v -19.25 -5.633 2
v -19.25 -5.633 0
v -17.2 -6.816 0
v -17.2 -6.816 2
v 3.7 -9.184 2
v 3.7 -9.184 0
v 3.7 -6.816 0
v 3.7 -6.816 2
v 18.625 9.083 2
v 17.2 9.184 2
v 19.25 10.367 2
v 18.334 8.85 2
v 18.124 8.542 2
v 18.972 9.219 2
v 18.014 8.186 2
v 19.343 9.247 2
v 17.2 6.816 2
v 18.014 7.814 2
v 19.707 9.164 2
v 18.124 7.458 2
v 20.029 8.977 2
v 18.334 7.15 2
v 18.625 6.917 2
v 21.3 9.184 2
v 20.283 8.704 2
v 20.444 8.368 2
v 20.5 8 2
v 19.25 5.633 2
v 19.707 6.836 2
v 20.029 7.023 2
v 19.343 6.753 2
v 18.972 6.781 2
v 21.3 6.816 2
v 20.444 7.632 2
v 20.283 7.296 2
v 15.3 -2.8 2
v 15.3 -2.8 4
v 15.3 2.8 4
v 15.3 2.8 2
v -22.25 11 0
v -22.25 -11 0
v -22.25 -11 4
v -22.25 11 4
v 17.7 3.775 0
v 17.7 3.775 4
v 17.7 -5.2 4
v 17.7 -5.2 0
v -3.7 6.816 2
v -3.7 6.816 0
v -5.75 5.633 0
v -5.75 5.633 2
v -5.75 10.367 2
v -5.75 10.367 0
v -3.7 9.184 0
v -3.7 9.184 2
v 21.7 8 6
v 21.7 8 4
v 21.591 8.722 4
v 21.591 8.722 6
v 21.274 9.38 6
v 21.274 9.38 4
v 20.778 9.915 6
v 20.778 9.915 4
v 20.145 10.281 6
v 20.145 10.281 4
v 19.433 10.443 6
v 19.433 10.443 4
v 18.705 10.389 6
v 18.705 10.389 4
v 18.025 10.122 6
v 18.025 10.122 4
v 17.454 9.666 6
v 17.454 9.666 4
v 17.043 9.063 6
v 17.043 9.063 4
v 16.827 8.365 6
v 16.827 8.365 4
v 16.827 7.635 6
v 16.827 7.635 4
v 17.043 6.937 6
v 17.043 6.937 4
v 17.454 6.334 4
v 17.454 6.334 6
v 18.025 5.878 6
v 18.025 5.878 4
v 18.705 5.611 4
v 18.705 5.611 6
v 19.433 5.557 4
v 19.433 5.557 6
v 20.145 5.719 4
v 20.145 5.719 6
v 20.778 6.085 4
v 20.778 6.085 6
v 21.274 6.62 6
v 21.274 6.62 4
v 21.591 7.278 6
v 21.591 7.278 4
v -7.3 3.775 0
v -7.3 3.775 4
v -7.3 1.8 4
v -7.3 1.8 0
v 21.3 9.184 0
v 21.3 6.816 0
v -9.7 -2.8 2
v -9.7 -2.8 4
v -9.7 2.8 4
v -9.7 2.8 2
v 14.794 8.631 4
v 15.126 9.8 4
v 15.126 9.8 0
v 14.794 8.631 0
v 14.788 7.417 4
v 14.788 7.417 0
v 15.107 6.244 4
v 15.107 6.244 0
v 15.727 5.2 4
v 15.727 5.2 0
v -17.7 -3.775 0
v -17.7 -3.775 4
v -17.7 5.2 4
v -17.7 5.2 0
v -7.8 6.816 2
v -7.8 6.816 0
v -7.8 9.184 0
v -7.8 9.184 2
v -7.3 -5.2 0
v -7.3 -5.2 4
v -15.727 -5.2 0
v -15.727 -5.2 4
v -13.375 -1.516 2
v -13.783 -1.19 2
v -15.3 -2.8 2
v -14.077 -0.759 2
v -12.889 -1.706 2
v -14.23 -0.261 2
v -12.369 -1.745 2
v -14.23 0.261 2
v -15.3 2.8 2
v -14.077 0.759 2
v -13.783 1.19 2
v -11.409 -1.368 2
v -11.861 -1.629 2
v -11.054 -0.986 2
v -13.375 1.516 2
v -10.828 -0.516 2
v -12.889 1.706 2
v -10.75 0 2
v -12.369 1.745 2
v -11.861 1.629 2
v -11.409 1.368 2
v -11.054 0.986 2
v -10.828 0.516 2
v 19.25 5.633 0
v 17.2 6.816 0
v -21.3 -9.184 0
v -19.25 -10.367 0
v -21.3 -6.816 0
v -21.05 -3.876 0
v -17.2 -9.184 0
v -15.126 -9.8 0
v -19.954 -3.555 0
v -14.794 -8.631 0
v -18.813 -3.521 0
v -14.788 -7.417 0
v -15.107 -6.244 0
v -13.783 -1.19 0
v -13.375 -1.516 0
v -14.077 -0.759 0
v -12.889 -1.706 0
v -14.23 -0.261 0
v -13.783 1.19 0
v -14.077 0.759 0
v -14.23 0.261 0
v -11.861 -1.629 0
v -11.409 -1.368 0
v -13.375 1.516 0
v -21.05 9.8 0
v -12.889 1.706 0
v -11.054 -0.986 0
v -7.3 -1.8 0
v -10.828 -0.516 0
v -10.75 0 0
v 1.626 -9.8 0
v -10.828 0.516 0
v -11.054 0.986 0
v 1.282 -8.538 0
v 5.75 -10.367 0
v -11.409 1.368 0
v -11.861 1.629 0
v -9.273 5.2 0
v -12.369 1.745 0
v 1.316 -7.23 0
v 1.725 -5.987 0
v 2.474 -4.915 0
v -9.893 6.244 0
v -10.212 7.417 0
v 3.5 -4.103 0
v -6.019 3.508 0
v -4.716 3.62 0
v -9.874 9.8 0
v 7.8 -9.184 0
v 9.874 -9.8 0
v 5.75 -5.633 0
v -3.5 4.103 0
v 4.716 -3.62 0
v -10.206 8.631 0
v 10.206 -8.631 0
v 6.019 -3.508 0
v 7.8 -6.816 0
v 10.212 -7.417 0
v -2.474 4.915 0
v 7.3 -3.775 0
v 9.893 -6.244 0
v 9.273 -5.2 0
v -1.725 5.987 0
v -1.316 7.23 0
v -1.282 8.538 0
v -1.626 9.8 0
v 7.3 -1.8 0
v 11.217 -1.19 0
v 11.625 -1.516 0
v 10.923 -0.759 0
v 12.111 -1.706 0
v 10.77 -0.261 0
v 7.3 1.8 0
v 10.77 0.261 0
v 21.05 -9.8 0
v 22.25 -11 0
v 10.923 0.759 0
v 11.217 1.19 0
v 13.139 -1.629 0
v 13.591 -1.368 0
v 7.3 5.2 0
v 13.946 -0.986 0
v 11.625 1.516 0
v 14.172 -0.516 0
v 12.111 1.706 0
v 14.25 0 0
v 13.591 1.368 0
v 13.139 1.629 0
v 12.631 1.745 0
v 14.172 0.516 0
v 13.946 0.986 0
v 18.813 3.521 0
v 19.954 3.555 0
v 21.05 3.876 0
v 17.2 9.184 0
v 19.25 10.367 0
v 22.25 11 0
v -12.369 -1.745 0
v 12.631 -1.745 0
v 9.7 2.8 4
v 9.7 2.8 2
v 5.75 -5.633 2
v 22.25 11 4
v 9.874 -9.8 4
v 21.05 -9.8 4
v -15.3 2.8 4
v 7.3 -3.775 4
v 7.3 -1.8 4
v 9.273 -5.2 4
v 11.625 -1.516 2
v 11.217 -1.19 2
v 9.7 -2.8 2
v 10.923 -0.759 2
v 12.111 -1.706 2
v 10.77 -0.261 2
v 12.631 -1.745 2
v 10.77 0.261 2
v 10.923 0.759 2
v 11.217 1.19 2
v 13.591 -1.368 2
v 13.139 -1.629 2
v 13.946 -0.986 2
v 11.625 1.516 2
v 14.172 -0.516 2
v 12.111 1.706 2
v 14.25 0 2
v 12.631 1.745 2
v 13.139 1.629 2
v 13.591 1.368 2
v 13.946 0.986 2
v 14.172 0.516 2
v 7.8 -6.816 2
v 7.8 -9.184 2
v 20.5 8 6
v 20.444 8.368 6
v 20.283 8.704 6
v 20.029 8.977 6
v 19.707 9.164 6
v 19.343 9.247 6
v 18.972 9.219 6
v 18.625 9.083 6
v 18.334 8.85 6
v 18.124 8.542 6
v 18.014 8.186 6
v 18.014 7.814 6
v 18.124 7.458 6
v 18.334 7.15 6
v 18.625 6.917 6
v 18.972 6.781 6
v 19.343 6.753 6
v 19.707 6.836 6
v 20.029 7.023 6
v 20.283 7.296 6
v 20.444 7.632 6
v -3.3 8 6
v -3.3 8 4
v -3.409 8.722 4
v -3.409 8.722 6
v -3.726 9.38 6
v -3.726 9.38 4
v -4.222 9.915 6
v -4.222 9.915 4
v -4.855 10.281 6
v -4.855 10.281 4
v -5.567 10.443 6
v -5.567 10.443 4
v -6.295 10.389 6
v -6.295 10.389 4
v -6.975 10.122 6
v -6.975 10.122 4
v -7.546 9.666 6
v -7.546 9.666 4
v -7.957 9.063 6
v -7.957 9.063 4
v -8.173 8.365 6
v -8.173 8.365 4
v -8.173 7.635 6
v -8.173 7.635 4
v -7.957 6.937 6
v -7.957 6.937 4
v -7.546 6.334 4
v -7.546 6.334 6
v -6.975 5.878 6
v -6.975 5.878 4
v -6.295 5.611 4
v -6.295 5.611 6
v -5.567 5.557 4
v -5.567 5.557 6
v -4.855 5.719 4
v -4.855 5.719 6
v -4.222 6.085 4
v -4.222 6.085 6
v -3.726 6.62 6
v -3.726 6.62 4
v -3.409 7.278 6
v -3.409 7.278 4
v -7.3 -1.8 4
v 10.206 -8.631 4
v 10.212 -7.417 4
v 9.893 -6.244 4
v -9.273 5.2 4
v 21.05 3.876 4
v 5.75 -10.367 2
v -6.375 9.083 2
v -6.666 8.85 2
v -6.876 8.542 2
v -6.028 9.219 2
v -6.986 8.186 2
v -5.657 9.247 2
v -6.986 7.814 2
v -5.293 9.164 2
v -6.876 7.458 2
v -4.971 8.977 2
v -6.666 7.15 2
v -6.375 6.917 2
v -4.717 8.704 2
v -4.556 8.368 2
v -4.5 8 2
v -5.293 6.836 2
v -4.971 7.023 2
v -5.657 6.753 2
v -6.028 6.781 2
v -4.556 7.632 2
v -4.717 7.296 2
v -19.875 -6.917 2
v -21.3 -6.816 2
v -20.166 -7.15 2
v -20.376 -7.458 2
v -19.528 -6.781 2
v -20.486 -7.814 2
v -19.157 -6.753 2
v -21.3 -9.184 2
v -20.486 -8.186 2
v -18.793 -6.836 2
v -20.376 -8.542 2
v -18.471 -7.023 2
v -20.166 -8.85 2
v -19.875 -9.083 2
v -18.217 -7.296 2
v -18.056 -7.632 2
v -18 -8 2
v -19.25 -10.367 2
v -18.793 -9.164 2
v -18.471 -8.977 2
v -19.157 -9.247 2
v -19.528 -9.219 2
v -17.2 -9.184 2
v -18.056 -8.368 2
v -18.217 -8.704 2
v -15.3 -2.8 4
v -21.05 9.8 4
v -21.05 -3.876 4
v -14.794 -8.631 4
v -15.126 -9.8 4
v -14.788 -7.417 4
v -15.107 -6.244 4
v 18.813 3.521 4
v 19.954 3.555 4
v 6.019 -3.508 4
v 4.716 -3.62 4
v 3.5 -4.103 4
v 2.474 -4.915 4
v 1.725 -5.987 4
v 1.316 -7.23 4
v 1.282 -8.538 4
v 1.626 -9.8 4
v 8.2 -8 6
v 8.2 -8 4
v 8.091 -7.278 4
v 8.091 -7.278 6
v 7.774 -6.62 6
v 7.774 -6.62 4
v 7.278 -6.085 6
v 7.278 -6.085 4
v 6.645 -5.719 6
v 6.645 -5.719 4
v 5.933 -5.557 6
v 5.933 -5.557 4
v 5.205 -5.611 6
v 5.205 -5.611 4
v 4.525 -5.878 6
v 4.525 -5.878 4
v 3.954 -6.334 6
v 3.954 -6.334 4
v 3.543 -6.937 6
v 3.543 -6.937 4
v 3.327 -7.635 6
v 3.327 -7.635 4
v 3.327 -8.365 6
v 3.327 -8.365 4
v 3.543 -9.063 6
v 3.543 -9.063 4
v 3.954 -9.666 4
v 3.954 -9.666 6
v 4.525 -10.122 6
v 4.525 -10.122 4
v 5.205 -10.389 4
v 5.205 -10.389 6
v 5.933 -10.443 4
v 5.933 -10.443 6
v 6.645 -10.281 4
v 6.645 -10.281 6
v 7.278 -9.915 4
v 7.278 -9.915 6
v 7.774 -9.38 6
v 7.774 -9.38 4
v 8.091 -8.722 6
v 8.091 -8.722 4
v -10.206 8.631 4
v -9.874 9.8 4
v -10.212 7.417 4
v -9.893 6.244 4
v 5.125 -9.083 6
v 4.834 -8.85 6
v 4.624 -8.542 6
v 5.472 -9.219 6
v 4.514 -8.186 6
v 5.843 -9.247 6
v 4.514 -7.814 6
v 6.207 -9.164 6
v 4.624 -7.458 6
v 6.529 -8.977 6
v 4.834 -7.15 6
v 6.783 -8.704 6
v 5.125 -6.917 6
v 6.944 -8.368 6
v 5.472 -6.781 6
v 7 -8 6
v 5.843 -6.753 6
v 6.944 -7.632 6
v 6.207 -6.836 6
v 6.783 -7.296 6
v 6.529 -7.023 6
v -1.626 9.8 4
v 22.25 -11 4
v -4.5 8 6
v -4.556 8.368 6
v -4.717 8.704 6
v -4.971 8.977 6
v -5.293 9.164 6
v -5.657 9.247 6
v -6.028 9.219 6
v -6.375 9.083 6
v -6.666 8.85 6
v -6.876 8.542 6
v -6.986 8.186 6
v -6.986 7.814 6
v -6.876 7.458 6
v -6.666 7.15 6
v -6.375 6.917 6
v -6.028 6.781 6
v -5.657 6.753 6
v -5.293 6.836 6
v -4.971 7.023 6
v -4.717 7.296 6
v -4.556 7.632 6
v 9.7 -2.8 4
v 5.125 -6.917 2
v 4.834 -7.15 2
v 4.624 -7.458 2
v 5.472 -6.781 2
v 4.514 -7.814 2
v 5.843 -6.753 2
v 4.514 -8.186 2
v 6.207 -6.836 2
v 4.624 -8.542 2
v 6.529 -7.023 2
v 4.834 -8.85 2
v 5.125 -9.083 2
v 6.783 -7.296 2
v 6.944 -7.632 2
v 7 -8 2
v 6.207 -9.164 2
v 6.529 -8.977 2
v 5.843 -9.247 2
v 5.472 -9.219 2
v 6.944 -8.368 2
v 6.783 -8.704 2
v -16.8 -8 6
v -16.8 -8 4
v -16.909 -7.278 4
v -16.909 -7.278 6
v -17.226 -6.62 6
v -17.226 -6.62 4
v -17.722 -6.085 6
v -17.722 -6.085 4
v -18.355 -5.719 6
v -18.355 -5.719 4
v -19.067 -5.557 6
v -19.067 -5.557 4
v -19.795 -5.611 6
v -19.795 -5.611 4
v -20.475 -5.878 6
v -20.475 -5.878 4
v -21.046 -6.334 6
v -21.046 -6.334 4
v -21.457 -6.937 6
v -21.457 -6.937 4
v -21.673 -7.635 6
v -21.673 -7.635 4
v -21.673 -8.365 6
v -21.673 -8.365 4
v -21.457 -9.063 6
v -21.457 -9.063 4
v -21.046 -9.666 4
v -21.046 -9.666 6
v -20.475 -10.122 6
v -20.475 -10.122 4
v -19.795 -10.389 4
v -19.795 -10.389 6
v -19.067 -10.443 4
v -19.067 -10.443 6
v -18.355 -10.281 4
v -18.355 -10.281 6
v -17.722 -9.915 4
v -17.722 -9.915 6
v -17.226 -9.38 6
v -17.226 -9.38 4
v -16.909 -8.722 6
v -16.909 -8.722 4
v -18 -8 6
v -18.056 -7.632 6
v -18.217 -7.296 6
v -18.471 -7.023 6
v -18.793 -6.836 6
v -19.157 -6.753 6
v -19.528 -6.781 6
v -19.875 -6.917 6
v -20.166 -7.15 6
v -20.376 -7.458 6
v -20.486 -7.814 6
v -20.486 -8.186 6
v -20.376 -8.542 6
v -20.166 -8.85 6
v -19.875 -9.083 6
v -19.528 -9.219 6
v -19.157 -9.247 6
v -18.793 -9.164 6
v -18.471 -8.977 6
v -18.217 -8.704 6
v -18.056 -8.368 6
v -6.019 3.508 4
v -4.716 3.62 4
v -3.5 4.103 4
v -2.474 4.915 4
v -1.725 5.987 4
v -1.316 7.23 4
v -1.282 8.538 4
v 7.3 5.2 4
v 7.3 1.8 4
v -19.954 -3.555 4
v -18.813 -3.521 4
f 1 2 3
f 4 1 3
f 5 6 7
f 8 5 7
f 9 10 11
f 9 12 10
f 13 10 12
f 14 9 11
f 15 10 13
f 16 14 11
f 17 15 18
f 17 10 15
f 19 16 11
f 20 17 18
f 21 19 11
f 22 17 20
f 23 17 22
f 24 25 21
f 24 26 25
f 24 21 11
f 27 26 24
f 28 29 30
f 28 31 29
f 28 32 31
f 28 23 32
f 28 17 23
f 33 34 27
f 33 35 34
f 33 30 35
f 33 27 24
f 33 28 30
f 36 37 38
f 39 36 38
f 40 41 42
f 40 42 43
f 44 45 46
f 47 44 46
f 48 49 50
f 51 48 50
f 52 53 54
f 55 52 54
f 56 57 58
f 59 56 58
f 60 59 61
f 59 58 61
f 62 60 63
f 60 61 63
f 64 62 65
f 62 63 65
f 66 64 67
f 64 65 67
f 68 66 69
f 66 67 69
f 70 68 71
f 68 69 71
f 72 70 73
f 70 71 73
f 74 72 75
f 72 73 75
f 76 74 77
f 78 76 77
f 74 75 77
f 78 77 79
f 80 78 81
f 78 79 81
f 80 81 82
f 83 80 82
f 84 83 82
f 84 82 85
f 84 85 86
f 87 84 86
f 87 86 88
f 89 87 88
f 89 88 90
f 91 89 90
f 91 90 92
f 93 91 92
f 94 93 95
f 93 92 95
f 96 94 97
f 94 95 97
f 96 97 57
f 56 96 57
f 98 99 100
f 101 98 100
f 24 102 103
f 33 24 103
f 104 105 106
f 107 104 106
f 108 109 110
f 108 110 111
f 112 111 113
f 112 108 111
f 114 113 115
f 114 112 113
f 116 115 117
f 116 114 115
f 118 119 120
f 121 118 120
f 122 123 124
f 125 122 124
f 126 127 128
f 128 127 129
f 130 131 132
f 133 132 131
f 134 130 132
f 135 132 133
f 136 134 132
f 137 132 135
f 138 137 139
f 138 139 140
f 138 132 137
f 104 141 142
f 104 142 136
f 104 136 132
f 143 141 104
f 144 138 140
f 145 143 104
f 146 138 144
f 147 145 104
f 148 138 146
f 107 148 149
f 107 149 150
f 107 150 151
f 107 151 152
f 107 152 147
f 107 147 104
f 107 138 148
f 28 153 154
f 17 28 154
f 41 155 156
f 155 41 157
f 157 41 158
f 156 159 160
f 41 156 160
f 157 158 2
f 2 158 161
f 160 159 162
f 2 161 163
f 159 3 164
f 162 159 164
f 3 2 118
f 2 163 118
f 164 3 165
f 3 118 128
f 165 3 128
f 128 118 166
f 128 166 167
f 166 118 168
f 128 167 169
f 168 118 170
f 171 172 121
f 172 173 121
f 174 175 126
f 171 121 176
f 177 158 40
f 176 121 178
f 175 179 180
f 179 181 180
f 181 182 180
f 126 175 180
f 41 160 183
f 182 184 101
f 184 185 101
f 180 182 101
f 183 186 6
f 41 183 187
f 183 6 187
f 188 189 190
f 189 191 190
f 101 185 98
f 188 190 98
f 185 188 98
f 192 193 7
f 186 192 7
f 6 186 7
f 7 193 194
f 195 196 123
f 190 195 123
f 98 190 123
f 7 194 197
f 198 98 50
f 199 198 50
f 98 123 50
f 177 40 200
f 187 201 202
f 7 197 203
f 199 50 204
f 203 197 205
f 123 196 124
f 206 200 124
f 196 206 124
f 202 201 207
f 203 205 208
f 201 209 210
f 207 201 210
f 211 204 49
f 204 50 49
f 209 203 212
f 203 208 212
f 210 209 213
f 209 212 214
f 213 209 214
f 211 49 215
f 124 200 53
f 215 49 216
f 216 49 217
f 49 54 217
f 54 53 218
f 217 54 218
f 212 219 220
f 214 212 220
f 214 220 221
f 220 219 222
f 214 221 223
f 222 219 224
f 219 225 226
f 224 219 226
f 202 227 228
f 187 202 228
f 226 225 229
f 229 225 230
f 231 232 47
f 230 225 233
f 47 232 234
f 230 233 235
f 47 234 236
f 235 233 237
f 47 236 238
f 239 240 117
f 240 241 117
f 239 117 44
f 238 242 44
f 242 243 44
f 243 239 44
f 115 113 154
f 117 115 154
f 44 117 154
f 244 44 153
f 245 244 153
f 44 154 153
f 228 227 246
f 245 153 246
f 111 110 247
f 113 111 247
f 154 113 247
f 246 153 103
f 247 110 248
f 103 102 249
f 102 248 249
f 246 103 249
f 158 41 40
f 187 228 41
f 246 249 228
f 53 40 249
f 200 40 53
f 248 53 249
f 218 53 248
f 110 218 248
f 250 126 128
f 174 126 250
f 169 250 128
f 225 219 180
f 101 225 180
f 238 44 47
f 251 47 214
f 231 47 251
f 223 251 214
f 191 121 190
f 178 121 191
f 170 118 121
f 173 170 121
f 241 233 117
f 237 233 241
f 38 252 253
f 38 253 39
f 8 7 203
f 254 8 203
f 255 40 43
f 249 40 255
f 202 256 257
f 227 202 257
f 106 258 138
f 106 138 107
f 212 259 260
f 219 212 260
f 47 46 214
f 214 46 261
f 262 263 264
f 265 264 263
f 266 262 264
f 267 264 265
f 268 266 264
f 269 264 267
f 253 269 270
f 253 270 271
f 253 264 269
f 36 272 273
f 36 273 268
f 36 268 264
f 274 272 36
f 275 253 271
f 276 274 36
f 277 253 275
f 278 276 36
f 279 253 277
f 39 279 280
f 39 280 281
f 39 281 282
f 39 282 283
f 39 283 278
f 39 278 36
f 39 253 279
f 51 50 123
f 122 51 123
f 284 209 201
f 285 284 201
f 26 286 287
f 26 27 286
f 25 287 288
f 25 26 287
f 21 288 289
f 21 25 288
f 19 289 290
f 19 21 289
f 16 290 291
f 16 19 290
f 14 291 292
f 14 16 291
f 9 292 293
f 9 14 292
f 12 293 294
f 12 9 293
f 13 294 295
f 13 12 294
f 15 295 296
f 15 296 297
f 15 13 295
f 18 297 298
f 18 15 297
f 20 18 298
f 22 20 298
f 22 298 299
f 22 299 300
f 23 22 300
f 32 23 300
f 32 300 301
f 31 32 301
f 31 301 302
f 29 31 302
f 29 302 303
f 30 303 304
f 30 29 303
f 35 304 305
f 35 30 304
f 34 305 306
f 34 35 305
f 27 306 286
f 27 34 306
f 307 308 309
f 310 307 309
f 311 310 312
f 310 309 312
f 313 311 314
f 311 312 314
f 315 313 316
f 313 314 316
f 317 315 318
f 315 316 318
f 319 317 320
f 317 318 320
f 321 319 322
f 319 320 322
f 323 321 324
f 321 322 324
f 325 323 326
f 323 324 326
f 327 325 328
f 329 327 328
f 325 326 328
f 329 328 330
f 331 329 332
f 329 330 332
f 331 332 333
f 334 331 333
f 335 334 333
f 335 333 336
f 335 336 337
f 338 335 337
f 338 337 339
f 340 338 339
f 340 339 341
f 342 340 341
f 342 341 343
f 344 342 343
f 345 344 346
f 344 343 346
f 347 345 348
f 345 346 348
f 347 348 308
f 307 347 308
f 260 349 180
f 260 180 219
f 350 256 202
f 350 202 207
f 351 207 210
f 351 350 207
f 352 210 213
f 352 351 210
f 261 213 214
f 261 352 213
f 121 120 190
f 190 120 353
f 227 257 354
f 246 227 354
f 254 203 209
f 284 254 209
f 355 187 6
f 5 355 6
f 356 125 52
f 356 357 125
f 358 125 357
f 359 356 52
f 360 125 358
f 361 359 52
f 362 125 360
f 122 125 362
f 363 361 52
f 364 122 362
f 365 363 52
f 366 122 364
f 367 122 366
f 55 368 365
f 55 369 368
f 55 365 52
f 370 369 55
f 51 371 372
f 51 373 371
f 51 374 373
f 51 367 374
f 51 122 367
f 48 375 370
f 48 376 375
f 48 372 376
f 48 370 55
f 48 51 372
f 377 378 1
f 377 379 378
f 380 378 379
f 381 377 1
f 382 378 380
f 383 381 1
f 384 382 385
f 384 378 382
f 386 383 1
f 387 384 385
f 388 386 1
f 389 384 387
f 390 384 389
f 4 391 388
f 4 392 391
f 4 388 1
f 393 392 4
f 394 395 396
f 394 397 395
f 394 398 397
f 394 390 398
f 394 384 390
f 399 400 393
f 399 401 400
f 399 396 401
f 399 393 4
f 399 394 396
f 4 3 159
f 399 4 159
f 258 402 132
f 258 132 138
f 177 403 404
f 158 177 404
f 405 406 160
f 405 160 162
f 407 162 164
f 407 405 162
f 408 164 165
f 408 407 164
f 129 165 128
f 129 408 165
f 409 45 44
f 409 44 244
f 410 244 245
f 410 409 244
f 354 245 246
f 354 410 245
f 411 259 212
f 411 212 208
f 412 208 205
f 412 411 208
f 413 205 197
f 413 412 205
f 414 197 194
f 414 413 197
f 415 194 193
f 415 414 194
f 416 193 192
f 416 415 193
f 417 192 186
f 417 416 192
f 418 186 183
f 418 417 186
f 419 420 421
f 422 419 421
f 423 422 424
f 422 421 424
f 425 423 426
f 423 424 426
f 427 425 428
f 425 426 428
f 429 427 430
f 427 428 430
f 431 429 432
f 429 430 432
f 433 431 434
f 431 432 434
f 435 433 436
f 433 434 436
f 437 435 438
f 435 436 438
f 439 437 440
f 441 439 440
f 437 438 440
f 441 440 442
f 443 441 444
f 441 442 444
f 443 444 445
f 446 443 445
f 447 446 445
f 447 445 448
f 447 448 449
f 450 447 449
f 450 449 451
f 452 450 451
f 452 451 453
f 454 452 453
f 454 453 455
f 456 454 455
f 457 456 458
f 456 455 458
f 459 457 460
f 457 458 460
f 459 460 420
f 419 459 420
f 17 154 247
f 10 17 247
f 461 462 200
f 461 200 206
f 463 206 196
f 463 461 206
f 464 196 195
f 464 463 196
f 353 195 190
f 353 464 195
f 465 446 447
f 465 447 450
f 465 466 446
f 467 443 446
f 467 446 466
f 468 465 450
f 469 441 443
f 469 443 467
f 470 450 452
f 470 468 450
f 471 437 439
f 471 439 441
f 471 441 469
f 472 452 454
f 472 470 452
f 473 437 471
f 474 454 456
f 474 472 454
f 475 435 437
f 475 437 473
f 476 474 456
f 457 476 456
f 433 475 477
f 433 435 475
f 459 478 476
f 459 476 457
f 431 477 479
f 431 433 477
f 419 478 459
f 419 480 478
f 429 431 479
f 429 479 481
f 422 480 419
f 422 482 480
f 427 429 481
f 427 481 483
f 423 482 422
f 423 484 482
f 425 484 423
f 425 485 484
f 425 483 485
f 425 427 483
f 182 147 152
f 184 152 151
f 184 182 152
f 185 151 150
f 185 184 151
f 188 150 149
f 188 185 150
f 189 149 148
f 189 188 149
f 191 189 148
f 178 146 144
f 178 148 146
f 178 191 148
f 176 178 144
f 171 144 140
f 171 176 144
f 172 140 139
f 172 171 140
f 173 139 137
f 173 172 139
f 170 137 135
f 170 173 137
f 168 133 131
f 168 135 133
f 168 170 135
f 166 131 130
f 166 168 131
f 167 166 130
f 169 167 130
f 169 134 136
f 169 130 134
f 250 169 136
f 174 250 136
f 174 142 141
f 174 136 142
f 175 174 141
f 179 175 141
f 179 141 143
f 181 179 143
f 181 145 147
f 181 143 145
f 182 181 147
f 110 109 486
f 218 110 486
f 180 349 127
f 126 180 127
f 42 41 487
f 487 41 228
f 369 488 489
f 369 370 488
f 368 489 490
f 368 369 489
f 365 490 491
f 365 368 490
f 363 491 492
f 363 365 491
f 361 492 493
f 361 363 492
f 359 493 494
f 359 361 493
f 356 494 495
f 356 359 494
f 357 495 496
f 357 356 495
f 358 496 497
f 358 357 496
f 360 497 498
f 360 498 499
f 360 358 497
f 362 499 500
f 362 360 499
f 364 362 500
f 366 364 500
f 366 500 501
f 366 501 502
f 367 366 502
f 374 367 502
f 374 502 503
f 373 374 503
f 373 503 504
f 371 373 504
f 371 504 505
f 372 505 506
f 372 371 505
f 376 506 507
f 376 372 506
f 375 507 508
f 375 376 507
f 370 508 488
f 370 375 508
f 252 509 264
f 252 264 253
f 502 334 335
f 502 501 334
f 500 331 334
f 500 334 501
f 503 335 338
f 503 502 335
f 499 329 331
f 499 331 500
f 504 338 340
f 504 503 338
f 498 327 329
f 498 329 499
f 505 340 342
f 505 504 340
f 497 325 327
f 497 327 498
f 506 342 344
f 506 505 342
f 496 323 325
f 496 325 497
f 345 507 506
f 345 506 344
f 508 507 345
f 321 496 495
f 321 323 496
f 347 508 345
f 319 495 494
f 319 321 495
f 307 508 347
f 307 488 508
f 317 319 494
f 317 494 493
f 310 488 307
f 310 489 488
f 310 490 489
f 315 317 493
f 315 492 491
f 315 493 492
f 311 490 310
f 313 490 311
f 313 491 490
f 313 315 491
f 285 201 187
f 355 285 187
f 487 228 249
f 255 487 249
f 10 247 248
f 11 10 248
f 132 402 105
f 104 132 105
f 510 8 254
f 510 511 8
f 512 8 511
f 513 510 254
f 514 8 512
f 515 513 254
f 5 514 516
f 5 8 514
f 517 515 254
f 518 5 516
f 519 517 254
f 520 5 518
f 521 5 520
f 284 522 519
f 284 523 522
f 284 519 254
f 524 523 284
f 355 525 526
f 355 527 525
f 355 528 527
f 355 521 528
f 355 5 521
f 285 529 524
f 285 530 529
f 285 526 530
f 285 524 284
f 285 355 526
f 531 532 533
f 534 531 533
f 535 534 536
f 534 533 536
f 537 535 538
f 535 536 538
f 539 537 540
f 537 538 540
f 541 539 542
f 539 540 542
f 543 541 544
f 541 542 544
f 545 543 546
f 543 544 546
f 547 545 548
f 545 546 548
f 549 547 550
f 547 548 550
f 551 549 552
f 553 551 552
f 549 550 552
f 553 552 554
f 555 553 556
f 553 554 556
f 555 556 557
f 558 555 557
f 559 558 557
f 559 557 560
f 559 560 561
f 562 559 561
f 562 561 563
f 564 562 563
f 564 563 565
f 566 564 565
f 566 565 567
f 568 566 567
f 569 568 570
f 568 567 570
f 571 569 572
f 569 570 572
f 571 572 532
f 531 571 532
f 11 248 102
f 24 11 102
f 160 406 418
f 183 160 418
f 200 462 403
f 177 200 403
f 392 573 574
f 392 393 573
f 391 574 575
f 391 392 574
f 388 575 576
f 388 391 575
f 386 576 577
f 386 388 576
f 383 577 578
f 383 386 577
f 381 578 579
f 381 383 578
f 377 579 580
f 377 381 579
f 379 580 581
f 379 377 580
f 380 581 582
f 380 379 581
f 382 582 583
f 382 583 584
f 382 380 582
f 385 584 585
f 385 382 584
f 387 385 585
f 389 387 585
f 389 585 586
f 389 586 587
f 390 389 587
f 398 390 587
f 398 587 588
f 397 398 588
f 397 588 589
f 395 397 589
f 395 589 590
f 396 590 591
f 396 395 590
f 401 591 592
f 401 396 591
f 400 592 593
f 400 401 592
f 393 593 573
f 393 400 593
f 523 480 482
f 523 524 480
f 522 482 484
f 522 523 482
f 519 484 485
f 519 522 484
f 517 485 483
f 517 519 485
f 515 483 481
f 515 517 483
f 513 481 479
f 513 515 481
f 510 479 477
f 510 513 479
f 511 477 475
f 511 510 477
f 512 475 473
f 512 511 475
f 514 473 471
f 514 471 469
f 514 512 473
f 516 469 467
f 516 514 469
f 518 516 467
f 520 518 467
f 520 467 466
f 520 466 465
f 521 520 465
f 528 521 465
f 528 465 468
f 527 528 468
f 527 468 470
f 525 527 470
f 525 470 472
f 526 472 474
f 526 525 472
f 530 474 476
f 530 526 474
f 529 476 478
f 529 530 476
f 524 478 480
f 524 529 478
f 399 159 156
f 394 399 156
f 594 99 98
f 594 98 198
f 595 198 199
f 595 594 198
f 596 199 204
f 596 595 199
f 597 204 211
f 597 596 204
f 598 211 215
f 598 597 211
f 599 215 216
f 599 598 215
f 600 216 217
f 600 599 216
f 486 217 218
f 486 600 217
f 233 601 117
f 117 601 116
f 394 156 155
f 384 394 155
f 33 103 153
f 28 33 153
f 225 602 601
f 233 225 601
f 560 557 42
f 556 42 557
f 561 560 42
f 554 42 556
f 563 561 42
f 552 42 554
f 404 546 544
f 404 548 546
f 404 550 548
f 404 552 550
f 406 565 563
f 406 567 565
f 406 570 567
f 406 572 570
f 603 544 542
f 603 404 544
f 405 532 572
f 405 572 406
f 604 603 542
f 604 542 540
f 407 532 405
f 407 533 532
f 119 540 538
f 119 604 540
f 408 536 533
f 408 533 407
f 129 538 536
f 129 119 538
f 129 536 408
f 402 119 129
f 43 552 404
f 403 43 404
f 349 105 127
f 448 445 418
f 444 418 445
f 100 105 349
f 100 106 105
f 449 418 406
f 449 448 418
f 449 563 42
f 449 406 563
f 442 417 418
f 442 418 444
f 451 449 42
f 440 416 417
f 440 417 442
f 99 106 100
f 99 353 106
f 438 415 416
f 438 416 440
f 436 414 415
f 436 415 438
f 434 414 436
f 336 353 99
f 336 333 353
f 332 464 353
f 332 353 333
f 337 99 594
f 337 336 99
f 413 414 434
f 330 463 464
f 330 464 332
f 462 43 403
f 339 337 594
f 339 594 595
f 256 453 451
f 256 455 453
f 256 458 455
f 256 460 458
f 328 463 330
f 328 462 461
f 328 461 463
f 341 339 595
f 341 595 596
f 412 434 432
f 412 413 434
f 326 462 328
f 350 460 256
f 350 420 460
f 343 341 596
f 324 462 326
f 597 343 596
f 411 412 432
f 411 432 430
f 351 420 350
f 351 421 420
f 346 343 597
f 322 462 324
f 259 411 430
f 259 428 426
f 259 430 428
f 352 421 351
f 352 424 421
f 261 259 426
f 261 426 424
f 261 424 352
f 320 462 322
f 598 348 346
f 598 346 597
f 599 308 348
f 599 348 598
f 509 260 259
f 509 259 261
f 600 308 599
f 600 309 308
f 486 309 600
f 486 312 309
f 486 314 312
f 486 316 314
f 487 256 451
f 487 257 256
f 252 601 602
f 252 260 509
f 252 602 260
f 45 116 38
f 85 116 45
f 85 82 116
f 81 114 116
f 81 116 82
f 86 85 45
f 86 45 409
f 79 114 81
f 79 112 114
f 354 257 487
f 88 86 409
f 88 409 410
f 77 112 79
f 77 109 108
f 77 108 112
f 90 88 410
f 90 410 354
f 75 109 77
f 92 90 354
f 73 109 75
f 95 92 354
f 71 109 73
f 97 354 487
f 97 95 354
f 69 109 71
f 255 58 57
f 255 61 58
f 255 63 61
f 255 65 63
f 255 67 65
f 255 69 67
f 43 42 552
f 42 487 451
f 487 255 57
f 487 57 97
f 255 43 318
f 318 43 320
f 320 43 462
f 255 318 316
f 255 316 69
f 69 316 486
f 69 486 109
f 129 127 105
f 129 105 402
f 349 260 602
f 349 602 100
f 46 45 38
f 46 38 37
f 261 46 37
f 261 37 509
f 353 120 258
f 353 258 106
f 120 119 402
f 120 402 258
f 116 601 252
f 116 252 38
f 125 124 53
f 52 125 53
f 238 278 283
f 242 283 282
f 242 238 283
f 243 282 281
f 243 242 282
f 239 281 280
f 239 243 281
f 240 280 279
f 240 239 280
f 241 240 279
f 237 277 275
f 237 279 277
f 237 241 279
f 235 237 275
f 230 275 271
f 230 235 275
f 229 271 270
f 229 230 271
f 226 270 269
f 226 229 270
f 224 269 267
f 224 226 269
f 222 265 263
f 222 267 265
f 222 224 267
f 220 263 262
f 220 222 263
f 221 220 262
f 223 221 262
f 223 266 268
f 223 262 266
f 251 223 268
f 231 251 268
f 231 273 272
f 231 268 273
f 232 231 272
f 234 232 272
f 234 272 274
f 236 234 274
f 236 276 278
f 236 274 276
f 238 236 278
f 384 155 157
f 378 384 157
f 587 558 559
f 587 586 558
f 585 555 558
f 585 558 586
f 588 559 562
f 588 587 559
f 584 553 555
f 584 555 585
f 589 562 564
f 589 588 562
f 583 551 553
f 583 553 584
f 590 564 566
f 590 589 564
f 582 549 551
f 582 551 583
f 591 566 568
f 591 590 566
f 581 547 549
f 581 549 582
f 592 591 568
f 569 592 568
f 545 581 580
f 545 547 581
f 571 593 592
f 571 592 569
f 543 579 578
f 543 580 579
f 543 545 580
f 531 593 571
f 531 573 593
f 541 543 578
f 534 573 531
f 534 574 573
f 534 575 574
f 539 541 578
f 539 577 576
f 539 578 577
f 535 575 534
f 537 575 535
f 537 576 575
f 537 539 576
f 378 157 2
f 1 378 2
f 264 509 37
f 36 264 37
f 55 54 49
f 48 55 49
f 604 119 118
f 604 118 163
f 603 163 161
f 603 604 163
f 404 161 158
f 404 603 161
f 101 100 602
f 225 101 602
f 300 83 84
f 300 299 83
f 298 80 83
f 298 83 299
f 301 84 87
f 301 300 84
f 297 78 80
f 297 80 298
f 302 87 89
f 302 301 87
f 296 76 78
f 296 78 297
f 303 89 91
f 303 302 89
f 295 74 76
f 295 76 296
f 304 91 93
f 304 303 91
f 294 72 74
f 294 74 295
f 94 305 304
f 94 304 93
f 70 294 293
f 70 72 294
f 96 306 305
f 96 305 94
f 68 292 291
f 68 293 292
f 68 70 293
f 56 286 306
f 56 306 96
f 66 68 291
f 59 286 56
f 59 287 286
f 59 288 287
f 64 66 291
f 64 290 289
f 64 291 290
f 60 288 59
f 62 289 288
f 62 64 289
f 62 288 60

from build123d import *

# Parameters (mm, degrees)
SKETCH_W        = 44.5
SKETCH_H        = 22
SKETCH_R        = 1.75
SKETCH_R_2      = 1.25
PAD_DEPTH       = 4
SKETCH001_W     = 5.6
SKETCH001_H     = 5.6
POCKET_DEPTH    = 2
POCKET001_DEPTH = 2
SKETCH003_R     = 2.45
SKETCH003_R_2   = 1.25
PAD001_DEPTH    = 2
POCKET002_DEPTH = 4.001


with BuildPart() as part:
    # Sketch → Pad (new body)
    with BuildSketch(Plane.XY):
        Rectangle(SKETCH_W, SKETCH_H)
        with Locations((-12.5, 0)):
            Circle(SKETCH_R, mode=Mode.SUBTRACT)
        with Locations((12.5, 0)):
            Circle(SKETCH_R, mode=Mode.SUBTRACT)
        with Locations((-19.25, -8)):
            Circle(SKETCH_R_2, mode=Mode.SUBTRACT)
        with Locations((-5.75, 8)):
            Circle(SKETCH_R_2, mode=Mode.SUBTRACT)
        with Locations((19.25, 8)):
            Circle(SKETCH_R_2, mode=Mode.SUBTRACT)
        with Locations((5.75, -8)):
            Circle(SKETCH_R_2, mode=Mode.SUBTRACT)
    extrude(amount=PAD_DEPTH)

    # Sketch001 (on Face12 of Pad) → Pocket (cut)
    with BuildSketch(Plane.XY.offset(4)):
        with Locations((-12.5, 0)):
            Rectangle(SKETCH001_W, SKETCH001_H)
        with Locations((12.5, 0)):
            Rectangle(SKETCH001_W, SKETCH001_H)
    extrude(amount=-POCKET_DEPTH, mode=Mode.SUBTRACT)

    # Sketch002 → Pocket001 (cut)
    with BuildSketch(Plane(origin=(0, 0, 0), x_dir=(1, 0, 0), z_dir=(0, 0, -1))):
        Polygon((-3.7, -6.816432), (-5.75, -5.632864), (-7.8, -6.816432), (-7.8, -9.183568), (-5.75, -10.367136), (-3.7, -9.183568), align=None)
        Polygon((7.8, 9.183568), (5.75, 10.367136), (3.7, 9.183568), (3.7, 6.816432), (5.75, 5.632864), (7.8, 6.816432), align=None)
        Polygon((21.3, -6.816432), (19.25, -5.632864), (17.2, -6.816432), (17.2, -9.183568), (19.25, -10.367136), (21.3, -9.183568), align=None)
        Polygon((-17.2, 9.183568), (-19.25, 10.367136), (-21.3, 9.183568), (-21.3, 6.816432), (-19.25, 5.632864), (-17.2, 6.816432), align=None)
    extrude(amount=-POCKET001_DEPTH, mode=Mode.SUBTRACT)

    # Sketch003 (on Face5 of Pocket001) → Pad001 (join)
    with BuildSketch(Plane.XY.offset(4)):
        with Locations((-5.75, 8)):
            Circle(SKETCH003_R)
        with Locations((-5.75, 8)):
            Circle(SKETCH003_R_2, mode=Mode.SUBTRACT)
        with Locations((19.25, 8)):
            Circle(SKETCH003_R)
        with Locations((19.25, 8)):
            Circle(SKETCH003_R_2, mode=Mode.SUBTRACT)
        with Locations((5.75, -8)):
            Circle(SKETCH003_R)
        with Locations((5.75, -8)):
            Circle(SKETCH003_R_2, mode=Mode.SUBTRACT)
        with Locations((-19.25, -8)):
            Circle(SKETCH003_R)
        with Locations((-19.25, -8)):
            Circle(SKETCH003_R_2, mode=Mode.SUBTRACT)
    extrude(amount=PAD001_DEPTH)

    # Sketch004 (on Face5 of Pad001) → Pocket002 (cut, through all)
    with BuildSketch(Plane.XY.offset(4)):
        with BuildLine():
            Line((-21.05, 9.8), (-21.05, -3.875682))
            ThreePointArc((-17.7, -3.77537), (-19.384687, -3.502016), (-21.05, -3.875682))
            Line((-17.7, -3.77537), (-17.7, 5.2))
            Line((-17.7, 5.2), (-9.272783, 5.2))
            ThreePointArc((-9.874318, 9.8), (-10.212011, 7.41651), (-9.272783, 5.2))
            Line((-9.874318, 9.8), (-21.05, 9.8))
        make_face()
        with BuildLine():
            Line((17.7, 3.77537), (17.7, -5.2))
            Line((17.7, -5.2), (9.272783, -5.2))
            ThreePointArc((9.874318, -9.8), (10.212011, -7.41651), (9.272783, -5.2))
            Line((9.874318, -9.8), (21.05, -9.8))
            Line((21.05, -9.8), (21.05, 3.875682))
            ThreePointArc((17.7, 3.77537), (19.384687, 3.502016), (21.05, 3.875682))
        make_face()
        with BuildLine():
            Line((-7.3, 3.77537), (-7.3, 1.8))
            Line((-7.3, 1.8), (7.3, 1.8))
            Line((7.3, 1.8), (7.3, 5.2))
            Line((7.3, 5.2), (15.727217, 5.2))
            ThreePointArc((15.125682, 9.8), (14.787989, 7.41651), (15.727217, 5.2))
            Line((15.125682, 9.8), (-1.625682, 9.8))
            ThreePointArc((-7.3, 3.77537), (-2.474207, 4.914683), (-1.625682, 9.8))
        make_face()
        with BuildLine():
            Line((-7.3, -5.2), (-15.727217, -5.2))
            ThreePointArc((-15.125682, -9.8), (-14.787989, -7.41651), (-15.727217, -5.2))
            Line((-15.125682, -9.8), (1.625682, -9.8))
            ThreePointArc((7.3, -3.77537), (2.474207, -4.914683), (1.625682, -9.8))
            Line((7.3, -3.77537), (7.3, -1.8))
            Line((-7.3, -1.8), (7.3, -1.8))
            Line((-7.3, -1.8), (-7.3, -5.2))
        make_face()
    extrude(amount=-POCKET002_DEPTH, mode=Mode.SUBTRACT)


solid = part.part
